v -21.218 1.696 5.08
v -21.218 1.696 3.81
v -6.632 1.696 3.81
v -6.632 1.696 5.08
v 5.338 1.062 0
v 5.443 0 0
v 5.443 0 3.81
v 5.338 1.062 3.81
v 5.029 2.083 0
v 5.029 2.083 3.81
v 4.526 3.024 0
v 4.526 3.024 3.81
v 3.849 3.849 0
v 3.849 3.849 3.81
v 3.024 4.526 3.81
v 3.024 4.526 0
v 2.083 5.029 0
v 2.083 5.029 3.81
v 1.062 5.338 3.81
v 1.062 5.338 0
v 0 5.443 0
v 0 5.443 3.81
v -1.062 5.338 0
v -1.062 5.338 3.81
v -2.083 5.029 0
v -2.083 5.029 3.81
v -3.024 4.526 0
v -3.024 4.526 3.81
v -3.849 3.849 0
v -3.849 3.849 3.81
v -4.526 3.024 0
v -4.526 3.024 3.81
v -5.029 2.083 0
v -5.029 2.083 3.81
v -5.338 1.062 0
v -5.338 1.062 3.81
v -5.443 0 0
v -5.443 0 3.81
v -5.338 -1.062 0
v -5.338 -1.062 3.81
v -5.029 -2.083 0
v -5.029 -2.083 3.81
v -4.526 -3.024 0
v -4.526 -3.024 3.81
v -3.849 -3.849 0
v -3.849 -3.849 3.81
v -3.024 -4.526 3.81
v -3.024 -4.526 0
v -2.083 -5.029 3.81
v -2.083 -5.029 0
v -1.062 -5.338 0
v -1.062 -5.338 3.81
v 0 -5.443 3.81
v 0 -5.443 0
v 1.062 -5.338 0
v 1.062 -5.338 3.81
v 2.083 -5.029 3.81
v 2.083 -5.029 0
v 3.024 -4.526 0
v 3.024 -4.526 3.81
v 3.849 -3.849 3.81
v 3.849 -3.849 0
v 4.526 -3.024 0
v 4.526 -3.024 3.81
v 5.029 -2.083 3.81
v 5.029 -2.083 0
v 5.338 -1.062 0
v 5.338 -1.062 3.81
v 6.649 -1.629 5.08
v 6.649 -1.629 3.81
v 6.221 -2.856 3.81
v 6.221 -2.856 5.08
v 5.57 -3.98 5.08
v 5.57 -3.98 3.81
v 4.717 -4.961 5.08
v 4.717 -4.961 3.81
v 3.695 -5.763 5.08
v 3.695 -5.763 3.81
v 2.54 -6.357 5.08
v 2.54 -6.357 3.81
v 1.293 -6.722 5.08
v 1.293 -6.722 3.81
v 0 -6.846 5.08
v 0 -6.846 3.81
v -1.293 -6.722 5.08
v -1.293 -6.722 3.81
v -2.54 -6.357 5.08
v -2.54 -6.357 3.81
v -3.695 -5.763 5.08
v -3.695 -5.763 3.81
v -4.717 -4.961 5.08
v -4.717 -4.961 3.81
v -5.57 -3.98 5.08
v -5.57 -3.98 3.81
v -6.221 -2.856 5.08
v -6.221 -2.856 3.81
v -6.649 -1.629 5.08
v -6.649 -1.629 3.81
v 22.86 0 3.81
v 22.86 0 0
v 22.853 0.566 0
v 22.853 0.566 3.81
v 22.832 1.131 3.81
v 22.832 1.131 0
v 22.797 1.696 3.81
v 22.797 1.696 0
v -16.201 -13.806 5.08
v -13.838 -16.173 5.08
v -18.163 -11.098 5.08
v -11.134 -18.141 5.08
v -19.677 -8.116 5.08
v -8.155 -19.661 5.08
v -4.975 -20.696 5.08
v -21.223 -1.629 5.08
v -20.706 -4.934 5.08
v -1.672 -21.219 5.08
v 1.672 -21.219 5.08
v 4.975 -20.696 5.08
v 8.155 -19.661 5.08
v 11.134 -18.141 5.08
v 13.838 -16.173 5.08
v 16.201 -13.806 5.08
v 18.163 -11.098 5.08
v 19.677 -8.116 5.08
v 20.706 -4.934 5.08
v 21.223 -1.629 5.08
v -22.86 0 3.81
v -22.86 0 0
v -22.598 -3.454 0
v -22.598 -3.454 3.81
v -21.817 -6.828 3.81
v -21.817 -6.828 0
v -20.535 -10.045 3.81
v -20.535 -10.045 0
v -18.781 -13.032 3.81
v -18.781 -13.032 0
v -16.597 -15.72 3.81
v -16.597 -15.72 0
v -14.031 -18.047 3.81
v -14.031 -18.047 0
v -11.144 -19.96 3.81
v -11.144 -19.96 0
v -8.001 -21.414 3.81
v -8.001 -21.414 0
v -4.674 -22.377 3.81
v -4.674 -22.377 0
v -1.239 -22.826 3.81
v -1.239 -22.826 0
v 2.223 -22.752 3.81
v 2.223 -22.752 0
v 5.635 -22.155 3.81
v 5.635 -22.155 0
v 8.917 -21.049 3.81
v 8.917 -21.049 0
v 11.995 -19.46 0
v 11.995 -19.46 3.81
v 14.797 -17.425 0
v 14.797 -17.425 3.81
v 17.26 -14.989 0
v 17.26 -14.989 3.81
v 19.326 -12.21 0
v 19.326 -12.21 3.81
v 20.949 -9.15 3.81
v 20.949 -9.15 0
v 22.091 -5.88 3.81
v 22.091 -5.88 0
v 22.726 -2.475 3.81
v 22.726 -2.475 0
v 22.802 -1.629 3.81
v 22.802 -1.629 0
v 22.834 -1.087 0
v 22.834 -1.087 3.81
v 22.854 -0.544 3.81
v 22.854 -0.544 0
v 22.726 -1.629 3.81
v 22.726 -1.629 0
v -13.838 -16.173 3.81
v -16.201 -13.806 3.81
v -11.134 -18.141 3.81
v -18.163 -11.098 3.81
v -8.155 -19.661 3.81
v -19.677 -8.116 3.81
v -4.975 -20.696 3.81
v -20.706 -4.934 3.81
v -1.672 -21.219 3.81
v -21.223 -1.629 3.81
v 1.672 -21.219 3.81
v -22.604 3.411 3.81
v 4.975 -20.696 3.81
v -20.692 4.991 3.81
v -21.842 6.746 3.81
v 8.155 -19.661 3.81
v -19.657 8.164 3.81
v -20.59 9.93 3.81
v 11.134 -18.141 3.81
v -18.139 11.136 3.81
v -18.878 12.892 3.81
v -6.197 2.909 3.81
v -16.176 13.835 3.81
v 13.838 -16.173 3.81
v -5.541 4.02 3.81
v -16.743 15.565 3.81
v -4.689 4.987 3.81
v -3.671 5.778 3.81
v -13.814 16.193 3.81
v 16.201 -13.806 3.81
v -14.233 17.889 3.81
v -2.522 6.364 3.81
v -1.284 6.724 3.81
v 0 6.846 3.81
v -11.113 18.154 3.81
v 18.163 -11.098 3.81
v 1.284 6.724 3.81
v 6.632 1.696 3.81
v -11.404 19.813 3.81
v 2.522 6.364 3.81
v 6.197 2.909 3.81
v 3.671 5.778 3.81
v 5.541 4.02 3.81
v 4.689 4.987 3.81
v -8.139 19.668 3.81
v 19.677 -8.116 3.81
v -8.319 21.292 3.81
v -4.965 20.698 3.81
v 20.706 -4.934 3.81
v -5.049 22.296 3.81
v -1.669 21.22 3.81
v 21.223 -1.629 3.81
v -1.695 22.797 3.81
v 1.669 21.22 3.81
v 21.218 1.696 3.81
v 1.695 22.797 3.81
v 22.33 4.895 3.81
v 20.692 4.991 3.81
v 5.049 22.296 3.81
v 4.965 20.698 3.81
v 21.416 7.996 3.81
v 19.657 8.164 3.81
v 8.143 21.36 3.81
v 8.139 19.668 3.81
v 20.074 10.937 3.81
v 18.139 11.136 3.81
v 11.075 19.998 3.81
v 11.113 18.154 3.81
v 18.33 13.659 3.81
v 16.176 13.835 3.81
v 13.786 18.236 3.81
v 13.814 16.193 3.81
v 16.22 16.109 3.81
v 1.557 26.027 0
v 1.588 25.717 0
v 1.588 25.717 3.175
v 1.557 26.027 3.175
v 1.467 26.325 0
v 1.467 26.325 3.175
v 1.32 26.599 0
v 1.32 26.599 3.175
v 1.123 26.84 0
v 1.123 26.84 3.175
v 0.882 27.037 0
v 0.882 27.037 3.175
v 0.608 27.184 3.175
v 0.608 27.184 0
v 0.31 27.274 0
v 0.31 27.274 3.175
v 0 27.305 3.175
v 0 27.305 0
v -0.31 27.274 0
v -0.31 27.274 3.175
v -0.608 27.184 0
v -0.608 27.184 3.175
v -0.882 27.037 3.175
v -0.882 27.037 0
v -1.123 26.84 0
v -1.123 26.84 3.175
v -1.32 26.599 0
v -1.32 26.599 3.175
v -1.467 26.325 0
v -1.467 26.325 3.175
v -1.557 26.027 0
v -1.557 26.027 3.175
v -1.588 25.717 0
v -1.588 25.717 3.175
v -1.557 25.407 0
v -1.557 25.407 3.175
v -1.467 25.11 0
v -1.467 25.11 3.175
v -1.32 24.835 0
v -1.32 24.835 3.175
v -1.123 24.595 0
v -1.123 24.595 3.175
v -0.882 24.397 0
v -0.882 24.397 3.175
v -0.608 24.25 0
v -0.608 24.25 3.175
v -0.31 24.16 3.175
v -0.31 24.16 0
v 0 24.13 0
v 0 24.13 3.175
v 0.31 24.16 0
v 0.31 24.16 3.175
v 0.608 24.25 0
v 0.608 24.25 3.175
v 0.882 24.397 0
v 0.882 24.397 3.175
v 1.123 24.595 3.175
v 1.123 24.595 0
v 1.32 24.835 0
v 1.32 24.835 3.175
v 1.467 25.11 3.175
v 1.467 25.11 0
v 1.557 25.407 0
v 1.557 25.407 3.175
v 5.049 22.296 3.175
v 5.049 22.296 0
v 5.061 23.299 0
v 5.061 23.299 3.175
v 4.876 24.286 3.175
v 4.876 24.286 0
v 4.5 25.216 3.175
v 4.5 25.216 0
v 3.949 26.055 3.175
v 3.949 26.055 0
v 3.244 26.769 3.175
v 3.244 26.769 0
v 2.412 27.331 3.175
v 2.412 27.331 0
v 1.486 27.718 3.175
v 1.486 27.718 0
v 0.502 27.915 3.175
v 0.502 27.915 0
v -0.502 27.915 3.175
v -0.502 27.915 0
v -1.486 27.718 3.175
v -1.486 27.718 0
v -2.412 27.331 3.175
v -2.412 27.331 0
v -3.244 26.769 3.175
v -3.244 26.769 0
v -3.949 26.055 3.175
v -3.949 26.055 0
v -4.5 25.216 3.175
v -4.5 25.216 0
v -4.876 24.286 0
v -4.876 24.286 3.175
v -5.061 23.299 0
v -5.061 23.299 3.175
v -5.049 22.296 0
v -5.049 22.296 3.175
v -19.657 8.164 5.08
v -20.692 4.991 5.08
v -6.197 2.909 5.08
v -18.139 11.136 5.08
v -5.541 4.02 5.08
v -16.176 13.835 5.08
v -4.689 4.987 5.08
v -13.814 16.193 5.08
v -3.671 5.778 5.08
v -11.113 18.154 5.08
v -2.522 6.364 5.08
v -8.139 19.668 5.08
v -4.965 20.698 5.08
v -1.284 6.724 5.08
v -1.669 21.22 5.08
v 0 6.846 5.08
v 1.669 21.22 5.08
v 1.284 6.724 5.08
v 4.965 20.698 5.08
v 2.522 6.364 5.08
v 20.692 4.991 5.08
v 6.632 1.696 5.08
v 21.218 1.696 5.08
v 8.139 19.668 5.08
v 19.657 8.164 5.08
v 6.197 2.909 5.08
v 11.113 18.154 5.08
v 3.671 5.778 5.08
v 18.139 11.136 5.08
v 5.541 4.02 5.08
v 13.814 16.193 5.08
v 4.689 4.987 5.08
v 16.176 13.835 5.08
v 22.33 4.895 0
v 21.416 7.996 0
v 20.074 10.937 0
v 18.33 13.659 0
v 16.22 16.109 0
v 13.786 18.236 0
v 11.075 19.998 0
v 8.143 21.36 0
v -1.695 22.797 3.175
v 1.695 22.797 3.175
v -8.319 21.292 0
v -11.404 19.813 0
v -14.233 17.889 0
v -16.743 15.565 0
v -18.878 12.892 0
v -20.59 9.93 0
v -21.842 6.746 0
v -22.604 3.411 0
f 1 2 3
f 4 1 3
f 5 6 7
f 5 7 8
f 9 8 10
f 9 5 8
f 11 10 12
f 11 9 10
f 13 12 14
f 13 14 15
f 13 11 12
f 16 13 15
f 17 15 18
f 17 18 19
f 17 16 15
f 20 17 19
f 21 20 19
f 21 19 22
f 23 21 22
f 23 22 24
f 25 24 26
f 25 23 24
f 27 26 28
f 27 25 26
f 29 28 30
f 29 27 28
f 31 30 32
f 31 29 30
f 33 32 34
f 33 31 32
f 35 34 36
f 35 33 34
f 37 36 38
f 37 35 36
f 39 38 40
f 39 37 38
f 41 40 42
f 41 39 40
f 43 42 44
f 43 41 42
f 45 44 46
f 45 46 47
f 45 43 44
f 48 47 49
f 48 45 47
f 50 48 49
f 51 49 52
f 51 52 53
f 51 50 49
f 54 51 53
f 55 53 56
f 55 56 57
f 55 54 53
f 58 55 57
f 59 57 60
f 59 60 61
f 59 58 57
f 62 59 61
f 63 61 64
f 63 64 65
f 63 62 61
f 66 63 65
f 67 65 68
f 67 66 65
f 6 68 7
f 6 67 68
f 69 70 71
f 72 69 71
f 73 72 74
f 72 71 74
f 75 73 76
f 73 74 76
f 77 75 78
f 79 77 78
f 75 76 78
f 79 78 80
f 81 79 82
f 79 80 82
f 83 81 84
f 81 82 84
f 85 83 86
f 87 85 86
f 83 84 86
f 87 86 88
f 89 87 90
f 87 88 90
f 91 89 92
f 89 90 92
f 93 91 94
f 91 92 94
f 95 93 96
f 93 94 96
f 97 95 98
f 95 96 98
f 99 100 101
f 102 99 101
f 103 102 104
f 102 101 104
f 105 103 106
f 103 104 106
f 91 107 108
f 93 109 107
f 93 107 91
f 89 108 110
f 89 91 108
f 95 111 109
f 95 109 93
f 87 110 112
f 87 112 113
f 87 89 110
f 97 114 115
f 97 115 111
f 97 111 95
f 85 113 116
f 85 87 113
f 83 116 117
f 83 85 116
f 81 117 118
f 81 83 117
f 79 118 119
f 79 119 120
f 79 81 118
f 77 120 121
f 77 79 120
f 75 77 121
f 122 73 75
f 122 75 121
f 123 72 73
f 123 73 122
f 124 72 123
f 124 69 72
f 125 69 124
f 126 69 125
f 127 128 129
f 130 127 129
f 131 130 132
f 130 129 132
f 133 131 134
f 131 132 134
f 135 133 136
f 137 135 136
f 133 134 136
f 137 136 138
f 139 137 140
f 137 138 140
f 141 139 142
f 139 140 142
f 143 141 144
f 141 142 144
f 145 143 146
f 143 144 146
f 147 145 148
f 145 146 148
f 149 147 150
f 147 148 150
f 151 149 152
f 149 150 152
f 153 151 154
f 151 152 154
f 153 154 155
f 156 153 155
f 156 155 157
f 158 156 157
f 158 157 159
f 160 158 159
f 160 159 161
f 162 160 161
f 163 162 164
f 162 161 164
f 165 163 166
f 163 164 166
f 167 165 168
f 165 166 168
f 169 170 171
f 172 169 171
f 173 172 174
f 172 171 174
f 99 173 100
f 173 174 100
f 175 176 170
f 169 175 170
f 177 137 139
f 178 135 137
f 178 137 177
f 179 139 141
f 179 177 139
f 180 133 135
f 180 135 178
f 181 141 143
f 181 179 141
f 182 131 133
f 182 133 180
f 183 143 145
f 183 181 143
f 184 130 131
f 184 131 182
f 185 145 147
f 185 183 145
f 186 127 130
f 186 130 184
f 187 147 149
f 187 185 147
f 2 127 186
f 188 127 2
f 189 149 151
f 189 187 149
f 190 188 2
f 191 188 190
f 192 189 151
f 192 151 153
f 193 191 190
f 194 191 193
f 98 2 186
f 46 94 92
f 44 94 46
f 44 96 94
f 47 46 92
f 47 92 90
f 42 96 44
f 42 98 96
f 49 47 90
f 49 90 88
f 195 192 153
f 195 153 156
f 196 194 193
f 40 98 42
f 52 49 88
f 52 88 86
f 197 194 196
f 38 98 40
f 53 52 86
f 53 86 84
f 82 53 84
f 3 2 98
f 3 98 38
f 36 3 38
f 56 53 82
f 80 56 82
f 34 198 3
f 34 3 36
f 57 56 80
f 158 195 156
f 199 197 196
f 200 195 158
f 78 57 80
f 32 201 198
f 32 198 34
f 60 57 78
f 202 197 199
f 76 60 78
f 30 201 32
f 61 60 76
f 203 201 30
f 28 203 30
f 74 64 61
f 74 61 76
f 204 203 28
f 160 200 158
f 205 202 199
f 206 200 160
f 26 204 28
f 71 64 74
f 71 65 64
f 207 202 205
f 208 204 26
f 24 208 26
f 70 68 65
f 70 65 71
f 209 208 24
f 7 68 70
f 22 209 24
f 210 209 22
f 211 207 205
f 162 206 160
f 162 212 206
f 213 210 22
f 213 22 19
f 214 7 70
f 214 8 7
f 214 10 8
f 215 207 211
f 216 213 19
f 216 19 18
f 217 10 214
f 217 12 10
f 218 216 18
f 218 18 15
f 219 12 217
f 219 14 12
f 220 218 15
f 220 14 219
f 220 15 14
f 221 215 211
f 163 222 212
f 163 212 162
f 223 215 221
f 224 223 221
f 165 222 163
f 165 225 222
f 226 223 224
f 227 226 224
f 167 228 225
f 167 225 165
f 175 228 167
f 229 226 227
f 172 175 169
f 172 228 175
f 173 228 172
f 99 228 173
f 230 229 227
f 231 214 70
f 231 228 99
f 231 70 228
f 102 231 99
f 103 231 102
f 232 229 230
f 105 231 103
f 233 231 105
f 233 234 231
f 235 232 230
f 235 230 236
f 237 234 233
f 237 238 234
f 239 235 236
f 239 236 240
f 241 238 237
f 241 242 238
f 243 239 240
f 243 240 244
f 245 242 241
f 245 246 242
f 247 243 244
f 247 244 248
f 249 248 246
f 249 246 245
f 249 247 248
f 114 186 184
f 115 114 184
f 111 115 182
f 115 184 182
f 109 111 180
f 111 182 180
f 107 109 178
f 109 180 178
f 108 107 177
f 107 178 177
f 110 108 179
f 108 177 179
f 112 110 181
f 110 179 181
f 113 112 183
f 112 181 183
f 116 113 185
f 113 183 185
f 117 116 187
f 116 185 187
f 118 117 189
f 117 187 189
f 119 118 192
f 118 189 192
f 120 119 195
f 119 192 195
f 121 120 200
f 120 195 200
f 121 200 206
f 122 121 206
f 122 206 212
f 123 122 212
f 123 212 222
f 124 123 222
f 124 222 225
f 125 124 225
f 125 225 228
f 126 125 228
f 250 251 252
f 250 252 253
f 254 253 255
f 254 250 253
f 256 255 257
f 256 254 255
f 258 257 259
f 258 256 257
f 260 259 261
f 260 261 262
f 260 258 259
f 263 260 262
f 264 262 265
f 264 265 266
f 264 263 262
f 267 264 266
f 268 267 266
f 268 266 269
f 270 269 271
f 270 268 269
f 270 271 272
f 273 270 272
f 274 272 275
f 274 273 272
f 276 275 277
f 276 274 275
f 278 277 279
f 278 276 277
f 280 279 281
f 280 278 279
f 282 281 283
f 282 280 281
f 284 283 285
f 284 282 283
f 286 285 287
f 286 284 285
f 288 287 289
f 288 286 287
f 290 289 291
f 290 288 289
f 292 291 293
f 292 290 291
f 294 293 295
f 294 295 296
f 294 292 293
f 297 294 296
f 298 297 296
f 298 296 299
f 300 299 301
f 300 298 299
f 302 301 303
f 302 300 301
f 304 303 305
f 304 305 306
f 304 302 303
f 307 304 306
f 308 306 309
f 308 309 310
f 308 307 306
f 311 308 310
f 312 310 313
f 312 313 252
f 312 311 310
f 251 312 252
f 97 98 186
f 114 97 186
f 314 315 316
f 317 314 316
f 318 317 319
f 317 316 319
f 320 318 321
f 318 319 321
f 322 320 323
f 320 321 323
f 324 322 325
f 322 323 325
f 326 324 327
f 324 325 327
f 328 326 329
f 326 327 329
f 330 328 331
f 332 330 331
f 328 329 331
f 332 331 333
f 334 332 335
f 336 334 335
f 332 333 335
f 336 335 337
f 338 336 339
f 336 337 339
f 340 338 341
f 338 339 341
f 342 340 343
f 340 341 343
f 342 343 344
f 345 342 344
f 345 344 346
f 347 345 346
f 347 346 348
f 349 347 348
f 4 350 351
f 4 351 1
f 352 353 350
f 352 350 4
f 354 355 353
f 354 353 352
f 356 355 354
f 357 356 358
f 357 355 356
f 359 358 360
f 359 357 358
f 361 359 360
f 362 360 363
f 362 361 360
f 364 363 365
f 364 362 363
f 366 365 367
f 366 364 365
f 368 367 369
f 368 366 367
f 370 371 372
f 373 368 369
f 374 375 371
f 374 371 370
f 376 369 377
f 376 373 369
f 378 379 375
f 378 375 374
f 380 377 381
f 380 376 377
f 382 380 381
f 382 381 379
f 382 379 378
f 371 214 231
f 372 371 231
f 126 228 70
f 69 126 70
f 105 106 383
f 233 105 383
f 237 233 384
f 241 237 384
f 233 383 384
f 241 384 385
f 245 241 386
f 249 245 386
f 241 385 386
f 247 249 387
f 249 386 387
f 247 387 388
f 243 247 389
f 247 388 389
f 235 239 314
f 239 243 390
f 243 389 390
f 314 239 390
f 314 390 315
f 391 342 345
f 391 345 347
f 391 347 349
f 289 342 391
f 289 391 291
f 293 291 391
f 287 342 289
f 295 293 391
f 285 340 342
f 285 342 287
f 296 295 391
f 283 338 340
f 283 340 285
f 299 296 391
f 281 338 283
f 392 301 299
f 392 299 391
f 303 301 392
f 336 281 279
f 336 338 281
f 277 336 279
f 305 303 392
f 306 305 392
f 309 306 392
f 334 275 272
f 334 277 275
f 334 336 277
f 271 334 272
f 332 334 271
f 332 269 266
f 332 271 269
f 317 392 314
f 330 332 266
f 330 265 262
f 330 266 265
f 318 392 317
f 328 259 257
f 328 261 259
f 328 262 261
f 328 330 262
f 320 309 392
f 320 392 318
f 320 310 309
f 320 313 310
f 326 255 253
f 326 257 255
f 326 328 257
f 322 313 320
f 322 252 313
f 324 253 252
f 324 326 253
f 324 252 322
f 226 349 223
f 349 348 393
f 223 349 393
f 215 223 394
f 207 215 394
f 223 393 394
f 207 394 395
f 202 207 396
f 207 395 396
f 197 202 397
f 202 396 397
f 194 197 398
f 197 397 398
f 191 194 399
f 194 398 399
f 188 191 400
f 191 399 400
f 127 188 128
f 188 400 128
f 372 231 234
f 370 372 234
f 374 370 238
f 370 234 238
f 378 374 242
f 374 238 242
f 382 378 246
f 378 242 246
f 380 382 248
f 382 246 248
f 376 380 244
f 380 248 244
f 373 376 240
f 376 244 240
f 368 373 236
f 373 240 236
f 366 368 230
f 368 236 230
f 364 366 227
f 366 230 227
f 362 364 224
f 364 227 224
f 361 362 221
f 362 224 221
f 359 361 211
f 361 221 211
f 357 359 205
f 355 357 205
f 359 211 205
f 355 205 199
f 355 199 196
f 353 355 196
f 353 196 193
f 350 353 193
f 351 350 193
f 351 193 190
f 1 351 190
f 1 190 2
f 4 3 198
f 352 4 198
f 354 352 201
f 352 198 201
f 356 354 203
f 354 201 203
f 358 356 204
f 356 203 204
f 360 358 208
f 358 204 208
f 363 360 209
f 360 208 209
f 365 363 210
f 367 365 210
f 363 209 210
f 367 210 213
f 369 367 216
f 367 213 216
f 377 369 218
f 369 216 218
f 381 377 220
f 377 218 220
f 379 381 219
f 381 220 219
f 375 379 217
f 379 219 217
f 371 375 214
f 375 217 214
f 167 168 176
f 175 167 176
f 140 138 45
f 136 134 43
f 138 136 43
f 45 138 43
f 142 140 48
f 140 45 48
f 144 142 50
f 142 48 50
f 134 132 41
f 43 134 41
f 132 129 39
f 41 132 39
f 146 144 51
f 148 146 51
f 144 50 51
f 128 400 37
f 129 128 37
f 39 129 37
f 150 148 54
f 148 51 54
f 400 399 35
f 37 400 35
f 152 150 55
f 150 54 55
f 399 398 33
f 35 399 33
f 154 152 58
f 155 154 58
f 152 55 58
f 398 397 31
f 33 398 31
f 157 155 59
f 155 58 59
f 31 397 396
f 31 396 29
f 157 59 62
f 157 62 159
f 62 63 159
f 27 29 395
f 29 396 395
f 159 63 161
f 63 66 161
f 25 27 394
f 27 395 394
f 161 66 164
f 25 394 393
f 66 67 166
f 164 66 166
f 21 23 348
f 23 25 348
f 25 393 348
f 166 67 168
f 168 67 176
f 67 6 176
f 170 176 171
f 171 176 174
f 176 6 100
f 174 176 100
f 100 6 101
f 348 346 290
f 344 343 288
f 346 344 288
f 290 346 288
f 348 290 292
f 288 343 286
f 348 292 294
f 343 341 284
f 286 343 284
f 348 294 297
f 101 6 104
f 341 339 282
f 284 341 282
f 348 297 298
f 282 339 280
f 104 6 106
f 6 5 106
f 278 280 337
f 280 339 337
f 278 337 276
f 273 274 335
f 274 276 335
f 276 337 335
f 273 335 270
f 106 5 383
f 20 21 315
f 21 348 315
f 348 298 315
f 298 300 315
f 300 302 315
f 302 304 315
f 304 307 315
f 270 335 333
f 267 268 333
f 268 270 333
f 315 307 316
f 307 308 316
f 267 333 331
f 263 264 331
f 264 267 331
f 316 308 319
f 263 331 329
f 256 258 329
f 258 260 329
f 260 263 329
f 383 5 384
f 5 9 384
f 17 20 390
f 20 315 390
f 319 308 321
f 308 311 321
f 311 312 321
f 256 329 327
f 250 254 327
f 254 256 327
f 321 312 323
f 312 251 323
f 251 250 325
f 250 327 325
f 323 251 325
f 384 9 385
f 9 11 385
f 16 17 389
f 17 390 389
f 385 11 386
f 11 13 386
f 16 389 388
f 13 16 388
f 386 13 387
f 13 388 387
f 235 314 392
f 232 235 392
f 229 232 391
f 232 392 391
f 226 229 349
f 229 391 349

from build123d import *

# Parameters (mm, degrees)
F1_DEPTH = 5.08
F0_R     = 5.442905
F2_DEPTH = 3.81
F0_R_2   = 1.5875
F3_DEPTH = 3.175


with BuildPart() as f1:
    # F0 (on Top) → F1 (new body)
    with BuildSketch(Plane.XY):
        with BuildLine():
            Line((-21.217541, 1.695553), (-21.167484, 1.695553))
            Line((-21.167484, 1.695553), (-6.632199, 1.695553))
            ThreePointArc((-6.632199, 1.695553), (0, 6.845507), (6.632199, 1.695553))
            Line((6.632199, 1.695553), (21.167484, 1.695553))
            Line((21.167484, 1.695553), (21.217541, 1.695553))
            ThreePointArc((21.217541, 1.695553), (0, 21.285181), (-21.217541, 1.695553))
        make_face()
        with BuildLine():
            Line((-6.648738, -1.629494), (-21.172672, -1.629494))
            Line((-21.172672, -1.629494), (-21.222716, -1.629494))
            ThreePointArc((-21.222716, -1.629494), (0, -21.285181), (21.222716, -1.629494))
            Line((21.222716, -1.629494), (21.172672, -1.629494))
            Line((21.172672, -1.629494), (6.648738, -1.629494))
            ThreePointArc((6.648738, -1.629494), (0, -6.845507), (-6.648738, -1.629494))
        make_face()
    extrude(amount=F1_DEPTH)

    # F0 (on Top) → F2 (join)
    with BuildSketch(Plane.XY):
        with BuildLine():
            ThreePointArc((22.80185, -1.629494), (22.845458, -0.815266), (22.86, 0))
            ThreePointArc((22.86, 0), (22.844253, 0.848361), (22.797033, 1.695553))
            ThreePointArc((22.797033, 1.695553), (17.318605, 14.921311), (5.048545, 22.295556))
            ThreePointArc((5.048545, 22.295556), (0, 22.86), (-5.048545, 22.295556))
            ThreePointArc((-5.048545, 22.295556), (-17.860422, 14.268319), (-22.86, 0))
            ThreePointArc((-22.86, 0), (-1.23935, -22.82638), (22.725618, -2.475054))
            Line((22.725618, -2.475054), (22.725618, -1.629494))
            Line((22.725618, -1.629494), (22.80185, -1.629494))
        make_face()
        with BuildLine():
            Line((-21.222716, -1.629494), (-21.172672, -1.629494))
            Line((-21.172672, -1.629494), (-6.648738, -1.629494))
            ThreePointArc((-6.648738, -1.629494), (0, -6.845507), (6.648738, -1.629494))
            Line((6.648738, -1.629494), (21.172672, -1.629494))
            Line((21.172672, -1.629494), (21.222716, -1.629494))
            ThreePointArc((21.222716, -1.629494), (0, -21.285181), (-21.222716, -1.629494))
        make_face(mode=Mode.SUBTRACT)
        Circle(F0_R, mode=Mode.SUBTRACT)
        with BuildLine():
            Line((-6.632199, 1.695553), (-21.167484, 1.695553))
            Line((-21.167484, 1.695553), (-21.217541, 1.695553))
            ThreePointArc((-21.217541, 1.695553), (0, 21.285181), (21.217541, 1.695553))
            Line((21.217541, 1.695553), (21.167484, 1.695553))
            Line((21.167484, 1.695553), (6.632199, 1.695553))
            ThreePointArc((6.632199, 1.695553), (0, 6.845507), (-6.632199, 1.695553))
        make_face(mode=Mode.SUBTRACT)
    extrude(amount=F2_DEPTH)

    # F0 (on Top) → F3 (join)
    with BuildSketch(Plane.XY):
        with BuildLine():
            ThreePointArc((-5.048545, 22.295556), (0, 22.86), (5.048545, 22.295556))
            ThreePointArc((5.048545, 22.295556), (0, 27.94), (-5.048545, 22.295556))
        make_face()
        with Locations((0, 25.717106)):
            Circle(F0_R_2, mode=Mode.SUBTRACT)
    extrude(amount=F3_DEPTH)


solid = f1.part
